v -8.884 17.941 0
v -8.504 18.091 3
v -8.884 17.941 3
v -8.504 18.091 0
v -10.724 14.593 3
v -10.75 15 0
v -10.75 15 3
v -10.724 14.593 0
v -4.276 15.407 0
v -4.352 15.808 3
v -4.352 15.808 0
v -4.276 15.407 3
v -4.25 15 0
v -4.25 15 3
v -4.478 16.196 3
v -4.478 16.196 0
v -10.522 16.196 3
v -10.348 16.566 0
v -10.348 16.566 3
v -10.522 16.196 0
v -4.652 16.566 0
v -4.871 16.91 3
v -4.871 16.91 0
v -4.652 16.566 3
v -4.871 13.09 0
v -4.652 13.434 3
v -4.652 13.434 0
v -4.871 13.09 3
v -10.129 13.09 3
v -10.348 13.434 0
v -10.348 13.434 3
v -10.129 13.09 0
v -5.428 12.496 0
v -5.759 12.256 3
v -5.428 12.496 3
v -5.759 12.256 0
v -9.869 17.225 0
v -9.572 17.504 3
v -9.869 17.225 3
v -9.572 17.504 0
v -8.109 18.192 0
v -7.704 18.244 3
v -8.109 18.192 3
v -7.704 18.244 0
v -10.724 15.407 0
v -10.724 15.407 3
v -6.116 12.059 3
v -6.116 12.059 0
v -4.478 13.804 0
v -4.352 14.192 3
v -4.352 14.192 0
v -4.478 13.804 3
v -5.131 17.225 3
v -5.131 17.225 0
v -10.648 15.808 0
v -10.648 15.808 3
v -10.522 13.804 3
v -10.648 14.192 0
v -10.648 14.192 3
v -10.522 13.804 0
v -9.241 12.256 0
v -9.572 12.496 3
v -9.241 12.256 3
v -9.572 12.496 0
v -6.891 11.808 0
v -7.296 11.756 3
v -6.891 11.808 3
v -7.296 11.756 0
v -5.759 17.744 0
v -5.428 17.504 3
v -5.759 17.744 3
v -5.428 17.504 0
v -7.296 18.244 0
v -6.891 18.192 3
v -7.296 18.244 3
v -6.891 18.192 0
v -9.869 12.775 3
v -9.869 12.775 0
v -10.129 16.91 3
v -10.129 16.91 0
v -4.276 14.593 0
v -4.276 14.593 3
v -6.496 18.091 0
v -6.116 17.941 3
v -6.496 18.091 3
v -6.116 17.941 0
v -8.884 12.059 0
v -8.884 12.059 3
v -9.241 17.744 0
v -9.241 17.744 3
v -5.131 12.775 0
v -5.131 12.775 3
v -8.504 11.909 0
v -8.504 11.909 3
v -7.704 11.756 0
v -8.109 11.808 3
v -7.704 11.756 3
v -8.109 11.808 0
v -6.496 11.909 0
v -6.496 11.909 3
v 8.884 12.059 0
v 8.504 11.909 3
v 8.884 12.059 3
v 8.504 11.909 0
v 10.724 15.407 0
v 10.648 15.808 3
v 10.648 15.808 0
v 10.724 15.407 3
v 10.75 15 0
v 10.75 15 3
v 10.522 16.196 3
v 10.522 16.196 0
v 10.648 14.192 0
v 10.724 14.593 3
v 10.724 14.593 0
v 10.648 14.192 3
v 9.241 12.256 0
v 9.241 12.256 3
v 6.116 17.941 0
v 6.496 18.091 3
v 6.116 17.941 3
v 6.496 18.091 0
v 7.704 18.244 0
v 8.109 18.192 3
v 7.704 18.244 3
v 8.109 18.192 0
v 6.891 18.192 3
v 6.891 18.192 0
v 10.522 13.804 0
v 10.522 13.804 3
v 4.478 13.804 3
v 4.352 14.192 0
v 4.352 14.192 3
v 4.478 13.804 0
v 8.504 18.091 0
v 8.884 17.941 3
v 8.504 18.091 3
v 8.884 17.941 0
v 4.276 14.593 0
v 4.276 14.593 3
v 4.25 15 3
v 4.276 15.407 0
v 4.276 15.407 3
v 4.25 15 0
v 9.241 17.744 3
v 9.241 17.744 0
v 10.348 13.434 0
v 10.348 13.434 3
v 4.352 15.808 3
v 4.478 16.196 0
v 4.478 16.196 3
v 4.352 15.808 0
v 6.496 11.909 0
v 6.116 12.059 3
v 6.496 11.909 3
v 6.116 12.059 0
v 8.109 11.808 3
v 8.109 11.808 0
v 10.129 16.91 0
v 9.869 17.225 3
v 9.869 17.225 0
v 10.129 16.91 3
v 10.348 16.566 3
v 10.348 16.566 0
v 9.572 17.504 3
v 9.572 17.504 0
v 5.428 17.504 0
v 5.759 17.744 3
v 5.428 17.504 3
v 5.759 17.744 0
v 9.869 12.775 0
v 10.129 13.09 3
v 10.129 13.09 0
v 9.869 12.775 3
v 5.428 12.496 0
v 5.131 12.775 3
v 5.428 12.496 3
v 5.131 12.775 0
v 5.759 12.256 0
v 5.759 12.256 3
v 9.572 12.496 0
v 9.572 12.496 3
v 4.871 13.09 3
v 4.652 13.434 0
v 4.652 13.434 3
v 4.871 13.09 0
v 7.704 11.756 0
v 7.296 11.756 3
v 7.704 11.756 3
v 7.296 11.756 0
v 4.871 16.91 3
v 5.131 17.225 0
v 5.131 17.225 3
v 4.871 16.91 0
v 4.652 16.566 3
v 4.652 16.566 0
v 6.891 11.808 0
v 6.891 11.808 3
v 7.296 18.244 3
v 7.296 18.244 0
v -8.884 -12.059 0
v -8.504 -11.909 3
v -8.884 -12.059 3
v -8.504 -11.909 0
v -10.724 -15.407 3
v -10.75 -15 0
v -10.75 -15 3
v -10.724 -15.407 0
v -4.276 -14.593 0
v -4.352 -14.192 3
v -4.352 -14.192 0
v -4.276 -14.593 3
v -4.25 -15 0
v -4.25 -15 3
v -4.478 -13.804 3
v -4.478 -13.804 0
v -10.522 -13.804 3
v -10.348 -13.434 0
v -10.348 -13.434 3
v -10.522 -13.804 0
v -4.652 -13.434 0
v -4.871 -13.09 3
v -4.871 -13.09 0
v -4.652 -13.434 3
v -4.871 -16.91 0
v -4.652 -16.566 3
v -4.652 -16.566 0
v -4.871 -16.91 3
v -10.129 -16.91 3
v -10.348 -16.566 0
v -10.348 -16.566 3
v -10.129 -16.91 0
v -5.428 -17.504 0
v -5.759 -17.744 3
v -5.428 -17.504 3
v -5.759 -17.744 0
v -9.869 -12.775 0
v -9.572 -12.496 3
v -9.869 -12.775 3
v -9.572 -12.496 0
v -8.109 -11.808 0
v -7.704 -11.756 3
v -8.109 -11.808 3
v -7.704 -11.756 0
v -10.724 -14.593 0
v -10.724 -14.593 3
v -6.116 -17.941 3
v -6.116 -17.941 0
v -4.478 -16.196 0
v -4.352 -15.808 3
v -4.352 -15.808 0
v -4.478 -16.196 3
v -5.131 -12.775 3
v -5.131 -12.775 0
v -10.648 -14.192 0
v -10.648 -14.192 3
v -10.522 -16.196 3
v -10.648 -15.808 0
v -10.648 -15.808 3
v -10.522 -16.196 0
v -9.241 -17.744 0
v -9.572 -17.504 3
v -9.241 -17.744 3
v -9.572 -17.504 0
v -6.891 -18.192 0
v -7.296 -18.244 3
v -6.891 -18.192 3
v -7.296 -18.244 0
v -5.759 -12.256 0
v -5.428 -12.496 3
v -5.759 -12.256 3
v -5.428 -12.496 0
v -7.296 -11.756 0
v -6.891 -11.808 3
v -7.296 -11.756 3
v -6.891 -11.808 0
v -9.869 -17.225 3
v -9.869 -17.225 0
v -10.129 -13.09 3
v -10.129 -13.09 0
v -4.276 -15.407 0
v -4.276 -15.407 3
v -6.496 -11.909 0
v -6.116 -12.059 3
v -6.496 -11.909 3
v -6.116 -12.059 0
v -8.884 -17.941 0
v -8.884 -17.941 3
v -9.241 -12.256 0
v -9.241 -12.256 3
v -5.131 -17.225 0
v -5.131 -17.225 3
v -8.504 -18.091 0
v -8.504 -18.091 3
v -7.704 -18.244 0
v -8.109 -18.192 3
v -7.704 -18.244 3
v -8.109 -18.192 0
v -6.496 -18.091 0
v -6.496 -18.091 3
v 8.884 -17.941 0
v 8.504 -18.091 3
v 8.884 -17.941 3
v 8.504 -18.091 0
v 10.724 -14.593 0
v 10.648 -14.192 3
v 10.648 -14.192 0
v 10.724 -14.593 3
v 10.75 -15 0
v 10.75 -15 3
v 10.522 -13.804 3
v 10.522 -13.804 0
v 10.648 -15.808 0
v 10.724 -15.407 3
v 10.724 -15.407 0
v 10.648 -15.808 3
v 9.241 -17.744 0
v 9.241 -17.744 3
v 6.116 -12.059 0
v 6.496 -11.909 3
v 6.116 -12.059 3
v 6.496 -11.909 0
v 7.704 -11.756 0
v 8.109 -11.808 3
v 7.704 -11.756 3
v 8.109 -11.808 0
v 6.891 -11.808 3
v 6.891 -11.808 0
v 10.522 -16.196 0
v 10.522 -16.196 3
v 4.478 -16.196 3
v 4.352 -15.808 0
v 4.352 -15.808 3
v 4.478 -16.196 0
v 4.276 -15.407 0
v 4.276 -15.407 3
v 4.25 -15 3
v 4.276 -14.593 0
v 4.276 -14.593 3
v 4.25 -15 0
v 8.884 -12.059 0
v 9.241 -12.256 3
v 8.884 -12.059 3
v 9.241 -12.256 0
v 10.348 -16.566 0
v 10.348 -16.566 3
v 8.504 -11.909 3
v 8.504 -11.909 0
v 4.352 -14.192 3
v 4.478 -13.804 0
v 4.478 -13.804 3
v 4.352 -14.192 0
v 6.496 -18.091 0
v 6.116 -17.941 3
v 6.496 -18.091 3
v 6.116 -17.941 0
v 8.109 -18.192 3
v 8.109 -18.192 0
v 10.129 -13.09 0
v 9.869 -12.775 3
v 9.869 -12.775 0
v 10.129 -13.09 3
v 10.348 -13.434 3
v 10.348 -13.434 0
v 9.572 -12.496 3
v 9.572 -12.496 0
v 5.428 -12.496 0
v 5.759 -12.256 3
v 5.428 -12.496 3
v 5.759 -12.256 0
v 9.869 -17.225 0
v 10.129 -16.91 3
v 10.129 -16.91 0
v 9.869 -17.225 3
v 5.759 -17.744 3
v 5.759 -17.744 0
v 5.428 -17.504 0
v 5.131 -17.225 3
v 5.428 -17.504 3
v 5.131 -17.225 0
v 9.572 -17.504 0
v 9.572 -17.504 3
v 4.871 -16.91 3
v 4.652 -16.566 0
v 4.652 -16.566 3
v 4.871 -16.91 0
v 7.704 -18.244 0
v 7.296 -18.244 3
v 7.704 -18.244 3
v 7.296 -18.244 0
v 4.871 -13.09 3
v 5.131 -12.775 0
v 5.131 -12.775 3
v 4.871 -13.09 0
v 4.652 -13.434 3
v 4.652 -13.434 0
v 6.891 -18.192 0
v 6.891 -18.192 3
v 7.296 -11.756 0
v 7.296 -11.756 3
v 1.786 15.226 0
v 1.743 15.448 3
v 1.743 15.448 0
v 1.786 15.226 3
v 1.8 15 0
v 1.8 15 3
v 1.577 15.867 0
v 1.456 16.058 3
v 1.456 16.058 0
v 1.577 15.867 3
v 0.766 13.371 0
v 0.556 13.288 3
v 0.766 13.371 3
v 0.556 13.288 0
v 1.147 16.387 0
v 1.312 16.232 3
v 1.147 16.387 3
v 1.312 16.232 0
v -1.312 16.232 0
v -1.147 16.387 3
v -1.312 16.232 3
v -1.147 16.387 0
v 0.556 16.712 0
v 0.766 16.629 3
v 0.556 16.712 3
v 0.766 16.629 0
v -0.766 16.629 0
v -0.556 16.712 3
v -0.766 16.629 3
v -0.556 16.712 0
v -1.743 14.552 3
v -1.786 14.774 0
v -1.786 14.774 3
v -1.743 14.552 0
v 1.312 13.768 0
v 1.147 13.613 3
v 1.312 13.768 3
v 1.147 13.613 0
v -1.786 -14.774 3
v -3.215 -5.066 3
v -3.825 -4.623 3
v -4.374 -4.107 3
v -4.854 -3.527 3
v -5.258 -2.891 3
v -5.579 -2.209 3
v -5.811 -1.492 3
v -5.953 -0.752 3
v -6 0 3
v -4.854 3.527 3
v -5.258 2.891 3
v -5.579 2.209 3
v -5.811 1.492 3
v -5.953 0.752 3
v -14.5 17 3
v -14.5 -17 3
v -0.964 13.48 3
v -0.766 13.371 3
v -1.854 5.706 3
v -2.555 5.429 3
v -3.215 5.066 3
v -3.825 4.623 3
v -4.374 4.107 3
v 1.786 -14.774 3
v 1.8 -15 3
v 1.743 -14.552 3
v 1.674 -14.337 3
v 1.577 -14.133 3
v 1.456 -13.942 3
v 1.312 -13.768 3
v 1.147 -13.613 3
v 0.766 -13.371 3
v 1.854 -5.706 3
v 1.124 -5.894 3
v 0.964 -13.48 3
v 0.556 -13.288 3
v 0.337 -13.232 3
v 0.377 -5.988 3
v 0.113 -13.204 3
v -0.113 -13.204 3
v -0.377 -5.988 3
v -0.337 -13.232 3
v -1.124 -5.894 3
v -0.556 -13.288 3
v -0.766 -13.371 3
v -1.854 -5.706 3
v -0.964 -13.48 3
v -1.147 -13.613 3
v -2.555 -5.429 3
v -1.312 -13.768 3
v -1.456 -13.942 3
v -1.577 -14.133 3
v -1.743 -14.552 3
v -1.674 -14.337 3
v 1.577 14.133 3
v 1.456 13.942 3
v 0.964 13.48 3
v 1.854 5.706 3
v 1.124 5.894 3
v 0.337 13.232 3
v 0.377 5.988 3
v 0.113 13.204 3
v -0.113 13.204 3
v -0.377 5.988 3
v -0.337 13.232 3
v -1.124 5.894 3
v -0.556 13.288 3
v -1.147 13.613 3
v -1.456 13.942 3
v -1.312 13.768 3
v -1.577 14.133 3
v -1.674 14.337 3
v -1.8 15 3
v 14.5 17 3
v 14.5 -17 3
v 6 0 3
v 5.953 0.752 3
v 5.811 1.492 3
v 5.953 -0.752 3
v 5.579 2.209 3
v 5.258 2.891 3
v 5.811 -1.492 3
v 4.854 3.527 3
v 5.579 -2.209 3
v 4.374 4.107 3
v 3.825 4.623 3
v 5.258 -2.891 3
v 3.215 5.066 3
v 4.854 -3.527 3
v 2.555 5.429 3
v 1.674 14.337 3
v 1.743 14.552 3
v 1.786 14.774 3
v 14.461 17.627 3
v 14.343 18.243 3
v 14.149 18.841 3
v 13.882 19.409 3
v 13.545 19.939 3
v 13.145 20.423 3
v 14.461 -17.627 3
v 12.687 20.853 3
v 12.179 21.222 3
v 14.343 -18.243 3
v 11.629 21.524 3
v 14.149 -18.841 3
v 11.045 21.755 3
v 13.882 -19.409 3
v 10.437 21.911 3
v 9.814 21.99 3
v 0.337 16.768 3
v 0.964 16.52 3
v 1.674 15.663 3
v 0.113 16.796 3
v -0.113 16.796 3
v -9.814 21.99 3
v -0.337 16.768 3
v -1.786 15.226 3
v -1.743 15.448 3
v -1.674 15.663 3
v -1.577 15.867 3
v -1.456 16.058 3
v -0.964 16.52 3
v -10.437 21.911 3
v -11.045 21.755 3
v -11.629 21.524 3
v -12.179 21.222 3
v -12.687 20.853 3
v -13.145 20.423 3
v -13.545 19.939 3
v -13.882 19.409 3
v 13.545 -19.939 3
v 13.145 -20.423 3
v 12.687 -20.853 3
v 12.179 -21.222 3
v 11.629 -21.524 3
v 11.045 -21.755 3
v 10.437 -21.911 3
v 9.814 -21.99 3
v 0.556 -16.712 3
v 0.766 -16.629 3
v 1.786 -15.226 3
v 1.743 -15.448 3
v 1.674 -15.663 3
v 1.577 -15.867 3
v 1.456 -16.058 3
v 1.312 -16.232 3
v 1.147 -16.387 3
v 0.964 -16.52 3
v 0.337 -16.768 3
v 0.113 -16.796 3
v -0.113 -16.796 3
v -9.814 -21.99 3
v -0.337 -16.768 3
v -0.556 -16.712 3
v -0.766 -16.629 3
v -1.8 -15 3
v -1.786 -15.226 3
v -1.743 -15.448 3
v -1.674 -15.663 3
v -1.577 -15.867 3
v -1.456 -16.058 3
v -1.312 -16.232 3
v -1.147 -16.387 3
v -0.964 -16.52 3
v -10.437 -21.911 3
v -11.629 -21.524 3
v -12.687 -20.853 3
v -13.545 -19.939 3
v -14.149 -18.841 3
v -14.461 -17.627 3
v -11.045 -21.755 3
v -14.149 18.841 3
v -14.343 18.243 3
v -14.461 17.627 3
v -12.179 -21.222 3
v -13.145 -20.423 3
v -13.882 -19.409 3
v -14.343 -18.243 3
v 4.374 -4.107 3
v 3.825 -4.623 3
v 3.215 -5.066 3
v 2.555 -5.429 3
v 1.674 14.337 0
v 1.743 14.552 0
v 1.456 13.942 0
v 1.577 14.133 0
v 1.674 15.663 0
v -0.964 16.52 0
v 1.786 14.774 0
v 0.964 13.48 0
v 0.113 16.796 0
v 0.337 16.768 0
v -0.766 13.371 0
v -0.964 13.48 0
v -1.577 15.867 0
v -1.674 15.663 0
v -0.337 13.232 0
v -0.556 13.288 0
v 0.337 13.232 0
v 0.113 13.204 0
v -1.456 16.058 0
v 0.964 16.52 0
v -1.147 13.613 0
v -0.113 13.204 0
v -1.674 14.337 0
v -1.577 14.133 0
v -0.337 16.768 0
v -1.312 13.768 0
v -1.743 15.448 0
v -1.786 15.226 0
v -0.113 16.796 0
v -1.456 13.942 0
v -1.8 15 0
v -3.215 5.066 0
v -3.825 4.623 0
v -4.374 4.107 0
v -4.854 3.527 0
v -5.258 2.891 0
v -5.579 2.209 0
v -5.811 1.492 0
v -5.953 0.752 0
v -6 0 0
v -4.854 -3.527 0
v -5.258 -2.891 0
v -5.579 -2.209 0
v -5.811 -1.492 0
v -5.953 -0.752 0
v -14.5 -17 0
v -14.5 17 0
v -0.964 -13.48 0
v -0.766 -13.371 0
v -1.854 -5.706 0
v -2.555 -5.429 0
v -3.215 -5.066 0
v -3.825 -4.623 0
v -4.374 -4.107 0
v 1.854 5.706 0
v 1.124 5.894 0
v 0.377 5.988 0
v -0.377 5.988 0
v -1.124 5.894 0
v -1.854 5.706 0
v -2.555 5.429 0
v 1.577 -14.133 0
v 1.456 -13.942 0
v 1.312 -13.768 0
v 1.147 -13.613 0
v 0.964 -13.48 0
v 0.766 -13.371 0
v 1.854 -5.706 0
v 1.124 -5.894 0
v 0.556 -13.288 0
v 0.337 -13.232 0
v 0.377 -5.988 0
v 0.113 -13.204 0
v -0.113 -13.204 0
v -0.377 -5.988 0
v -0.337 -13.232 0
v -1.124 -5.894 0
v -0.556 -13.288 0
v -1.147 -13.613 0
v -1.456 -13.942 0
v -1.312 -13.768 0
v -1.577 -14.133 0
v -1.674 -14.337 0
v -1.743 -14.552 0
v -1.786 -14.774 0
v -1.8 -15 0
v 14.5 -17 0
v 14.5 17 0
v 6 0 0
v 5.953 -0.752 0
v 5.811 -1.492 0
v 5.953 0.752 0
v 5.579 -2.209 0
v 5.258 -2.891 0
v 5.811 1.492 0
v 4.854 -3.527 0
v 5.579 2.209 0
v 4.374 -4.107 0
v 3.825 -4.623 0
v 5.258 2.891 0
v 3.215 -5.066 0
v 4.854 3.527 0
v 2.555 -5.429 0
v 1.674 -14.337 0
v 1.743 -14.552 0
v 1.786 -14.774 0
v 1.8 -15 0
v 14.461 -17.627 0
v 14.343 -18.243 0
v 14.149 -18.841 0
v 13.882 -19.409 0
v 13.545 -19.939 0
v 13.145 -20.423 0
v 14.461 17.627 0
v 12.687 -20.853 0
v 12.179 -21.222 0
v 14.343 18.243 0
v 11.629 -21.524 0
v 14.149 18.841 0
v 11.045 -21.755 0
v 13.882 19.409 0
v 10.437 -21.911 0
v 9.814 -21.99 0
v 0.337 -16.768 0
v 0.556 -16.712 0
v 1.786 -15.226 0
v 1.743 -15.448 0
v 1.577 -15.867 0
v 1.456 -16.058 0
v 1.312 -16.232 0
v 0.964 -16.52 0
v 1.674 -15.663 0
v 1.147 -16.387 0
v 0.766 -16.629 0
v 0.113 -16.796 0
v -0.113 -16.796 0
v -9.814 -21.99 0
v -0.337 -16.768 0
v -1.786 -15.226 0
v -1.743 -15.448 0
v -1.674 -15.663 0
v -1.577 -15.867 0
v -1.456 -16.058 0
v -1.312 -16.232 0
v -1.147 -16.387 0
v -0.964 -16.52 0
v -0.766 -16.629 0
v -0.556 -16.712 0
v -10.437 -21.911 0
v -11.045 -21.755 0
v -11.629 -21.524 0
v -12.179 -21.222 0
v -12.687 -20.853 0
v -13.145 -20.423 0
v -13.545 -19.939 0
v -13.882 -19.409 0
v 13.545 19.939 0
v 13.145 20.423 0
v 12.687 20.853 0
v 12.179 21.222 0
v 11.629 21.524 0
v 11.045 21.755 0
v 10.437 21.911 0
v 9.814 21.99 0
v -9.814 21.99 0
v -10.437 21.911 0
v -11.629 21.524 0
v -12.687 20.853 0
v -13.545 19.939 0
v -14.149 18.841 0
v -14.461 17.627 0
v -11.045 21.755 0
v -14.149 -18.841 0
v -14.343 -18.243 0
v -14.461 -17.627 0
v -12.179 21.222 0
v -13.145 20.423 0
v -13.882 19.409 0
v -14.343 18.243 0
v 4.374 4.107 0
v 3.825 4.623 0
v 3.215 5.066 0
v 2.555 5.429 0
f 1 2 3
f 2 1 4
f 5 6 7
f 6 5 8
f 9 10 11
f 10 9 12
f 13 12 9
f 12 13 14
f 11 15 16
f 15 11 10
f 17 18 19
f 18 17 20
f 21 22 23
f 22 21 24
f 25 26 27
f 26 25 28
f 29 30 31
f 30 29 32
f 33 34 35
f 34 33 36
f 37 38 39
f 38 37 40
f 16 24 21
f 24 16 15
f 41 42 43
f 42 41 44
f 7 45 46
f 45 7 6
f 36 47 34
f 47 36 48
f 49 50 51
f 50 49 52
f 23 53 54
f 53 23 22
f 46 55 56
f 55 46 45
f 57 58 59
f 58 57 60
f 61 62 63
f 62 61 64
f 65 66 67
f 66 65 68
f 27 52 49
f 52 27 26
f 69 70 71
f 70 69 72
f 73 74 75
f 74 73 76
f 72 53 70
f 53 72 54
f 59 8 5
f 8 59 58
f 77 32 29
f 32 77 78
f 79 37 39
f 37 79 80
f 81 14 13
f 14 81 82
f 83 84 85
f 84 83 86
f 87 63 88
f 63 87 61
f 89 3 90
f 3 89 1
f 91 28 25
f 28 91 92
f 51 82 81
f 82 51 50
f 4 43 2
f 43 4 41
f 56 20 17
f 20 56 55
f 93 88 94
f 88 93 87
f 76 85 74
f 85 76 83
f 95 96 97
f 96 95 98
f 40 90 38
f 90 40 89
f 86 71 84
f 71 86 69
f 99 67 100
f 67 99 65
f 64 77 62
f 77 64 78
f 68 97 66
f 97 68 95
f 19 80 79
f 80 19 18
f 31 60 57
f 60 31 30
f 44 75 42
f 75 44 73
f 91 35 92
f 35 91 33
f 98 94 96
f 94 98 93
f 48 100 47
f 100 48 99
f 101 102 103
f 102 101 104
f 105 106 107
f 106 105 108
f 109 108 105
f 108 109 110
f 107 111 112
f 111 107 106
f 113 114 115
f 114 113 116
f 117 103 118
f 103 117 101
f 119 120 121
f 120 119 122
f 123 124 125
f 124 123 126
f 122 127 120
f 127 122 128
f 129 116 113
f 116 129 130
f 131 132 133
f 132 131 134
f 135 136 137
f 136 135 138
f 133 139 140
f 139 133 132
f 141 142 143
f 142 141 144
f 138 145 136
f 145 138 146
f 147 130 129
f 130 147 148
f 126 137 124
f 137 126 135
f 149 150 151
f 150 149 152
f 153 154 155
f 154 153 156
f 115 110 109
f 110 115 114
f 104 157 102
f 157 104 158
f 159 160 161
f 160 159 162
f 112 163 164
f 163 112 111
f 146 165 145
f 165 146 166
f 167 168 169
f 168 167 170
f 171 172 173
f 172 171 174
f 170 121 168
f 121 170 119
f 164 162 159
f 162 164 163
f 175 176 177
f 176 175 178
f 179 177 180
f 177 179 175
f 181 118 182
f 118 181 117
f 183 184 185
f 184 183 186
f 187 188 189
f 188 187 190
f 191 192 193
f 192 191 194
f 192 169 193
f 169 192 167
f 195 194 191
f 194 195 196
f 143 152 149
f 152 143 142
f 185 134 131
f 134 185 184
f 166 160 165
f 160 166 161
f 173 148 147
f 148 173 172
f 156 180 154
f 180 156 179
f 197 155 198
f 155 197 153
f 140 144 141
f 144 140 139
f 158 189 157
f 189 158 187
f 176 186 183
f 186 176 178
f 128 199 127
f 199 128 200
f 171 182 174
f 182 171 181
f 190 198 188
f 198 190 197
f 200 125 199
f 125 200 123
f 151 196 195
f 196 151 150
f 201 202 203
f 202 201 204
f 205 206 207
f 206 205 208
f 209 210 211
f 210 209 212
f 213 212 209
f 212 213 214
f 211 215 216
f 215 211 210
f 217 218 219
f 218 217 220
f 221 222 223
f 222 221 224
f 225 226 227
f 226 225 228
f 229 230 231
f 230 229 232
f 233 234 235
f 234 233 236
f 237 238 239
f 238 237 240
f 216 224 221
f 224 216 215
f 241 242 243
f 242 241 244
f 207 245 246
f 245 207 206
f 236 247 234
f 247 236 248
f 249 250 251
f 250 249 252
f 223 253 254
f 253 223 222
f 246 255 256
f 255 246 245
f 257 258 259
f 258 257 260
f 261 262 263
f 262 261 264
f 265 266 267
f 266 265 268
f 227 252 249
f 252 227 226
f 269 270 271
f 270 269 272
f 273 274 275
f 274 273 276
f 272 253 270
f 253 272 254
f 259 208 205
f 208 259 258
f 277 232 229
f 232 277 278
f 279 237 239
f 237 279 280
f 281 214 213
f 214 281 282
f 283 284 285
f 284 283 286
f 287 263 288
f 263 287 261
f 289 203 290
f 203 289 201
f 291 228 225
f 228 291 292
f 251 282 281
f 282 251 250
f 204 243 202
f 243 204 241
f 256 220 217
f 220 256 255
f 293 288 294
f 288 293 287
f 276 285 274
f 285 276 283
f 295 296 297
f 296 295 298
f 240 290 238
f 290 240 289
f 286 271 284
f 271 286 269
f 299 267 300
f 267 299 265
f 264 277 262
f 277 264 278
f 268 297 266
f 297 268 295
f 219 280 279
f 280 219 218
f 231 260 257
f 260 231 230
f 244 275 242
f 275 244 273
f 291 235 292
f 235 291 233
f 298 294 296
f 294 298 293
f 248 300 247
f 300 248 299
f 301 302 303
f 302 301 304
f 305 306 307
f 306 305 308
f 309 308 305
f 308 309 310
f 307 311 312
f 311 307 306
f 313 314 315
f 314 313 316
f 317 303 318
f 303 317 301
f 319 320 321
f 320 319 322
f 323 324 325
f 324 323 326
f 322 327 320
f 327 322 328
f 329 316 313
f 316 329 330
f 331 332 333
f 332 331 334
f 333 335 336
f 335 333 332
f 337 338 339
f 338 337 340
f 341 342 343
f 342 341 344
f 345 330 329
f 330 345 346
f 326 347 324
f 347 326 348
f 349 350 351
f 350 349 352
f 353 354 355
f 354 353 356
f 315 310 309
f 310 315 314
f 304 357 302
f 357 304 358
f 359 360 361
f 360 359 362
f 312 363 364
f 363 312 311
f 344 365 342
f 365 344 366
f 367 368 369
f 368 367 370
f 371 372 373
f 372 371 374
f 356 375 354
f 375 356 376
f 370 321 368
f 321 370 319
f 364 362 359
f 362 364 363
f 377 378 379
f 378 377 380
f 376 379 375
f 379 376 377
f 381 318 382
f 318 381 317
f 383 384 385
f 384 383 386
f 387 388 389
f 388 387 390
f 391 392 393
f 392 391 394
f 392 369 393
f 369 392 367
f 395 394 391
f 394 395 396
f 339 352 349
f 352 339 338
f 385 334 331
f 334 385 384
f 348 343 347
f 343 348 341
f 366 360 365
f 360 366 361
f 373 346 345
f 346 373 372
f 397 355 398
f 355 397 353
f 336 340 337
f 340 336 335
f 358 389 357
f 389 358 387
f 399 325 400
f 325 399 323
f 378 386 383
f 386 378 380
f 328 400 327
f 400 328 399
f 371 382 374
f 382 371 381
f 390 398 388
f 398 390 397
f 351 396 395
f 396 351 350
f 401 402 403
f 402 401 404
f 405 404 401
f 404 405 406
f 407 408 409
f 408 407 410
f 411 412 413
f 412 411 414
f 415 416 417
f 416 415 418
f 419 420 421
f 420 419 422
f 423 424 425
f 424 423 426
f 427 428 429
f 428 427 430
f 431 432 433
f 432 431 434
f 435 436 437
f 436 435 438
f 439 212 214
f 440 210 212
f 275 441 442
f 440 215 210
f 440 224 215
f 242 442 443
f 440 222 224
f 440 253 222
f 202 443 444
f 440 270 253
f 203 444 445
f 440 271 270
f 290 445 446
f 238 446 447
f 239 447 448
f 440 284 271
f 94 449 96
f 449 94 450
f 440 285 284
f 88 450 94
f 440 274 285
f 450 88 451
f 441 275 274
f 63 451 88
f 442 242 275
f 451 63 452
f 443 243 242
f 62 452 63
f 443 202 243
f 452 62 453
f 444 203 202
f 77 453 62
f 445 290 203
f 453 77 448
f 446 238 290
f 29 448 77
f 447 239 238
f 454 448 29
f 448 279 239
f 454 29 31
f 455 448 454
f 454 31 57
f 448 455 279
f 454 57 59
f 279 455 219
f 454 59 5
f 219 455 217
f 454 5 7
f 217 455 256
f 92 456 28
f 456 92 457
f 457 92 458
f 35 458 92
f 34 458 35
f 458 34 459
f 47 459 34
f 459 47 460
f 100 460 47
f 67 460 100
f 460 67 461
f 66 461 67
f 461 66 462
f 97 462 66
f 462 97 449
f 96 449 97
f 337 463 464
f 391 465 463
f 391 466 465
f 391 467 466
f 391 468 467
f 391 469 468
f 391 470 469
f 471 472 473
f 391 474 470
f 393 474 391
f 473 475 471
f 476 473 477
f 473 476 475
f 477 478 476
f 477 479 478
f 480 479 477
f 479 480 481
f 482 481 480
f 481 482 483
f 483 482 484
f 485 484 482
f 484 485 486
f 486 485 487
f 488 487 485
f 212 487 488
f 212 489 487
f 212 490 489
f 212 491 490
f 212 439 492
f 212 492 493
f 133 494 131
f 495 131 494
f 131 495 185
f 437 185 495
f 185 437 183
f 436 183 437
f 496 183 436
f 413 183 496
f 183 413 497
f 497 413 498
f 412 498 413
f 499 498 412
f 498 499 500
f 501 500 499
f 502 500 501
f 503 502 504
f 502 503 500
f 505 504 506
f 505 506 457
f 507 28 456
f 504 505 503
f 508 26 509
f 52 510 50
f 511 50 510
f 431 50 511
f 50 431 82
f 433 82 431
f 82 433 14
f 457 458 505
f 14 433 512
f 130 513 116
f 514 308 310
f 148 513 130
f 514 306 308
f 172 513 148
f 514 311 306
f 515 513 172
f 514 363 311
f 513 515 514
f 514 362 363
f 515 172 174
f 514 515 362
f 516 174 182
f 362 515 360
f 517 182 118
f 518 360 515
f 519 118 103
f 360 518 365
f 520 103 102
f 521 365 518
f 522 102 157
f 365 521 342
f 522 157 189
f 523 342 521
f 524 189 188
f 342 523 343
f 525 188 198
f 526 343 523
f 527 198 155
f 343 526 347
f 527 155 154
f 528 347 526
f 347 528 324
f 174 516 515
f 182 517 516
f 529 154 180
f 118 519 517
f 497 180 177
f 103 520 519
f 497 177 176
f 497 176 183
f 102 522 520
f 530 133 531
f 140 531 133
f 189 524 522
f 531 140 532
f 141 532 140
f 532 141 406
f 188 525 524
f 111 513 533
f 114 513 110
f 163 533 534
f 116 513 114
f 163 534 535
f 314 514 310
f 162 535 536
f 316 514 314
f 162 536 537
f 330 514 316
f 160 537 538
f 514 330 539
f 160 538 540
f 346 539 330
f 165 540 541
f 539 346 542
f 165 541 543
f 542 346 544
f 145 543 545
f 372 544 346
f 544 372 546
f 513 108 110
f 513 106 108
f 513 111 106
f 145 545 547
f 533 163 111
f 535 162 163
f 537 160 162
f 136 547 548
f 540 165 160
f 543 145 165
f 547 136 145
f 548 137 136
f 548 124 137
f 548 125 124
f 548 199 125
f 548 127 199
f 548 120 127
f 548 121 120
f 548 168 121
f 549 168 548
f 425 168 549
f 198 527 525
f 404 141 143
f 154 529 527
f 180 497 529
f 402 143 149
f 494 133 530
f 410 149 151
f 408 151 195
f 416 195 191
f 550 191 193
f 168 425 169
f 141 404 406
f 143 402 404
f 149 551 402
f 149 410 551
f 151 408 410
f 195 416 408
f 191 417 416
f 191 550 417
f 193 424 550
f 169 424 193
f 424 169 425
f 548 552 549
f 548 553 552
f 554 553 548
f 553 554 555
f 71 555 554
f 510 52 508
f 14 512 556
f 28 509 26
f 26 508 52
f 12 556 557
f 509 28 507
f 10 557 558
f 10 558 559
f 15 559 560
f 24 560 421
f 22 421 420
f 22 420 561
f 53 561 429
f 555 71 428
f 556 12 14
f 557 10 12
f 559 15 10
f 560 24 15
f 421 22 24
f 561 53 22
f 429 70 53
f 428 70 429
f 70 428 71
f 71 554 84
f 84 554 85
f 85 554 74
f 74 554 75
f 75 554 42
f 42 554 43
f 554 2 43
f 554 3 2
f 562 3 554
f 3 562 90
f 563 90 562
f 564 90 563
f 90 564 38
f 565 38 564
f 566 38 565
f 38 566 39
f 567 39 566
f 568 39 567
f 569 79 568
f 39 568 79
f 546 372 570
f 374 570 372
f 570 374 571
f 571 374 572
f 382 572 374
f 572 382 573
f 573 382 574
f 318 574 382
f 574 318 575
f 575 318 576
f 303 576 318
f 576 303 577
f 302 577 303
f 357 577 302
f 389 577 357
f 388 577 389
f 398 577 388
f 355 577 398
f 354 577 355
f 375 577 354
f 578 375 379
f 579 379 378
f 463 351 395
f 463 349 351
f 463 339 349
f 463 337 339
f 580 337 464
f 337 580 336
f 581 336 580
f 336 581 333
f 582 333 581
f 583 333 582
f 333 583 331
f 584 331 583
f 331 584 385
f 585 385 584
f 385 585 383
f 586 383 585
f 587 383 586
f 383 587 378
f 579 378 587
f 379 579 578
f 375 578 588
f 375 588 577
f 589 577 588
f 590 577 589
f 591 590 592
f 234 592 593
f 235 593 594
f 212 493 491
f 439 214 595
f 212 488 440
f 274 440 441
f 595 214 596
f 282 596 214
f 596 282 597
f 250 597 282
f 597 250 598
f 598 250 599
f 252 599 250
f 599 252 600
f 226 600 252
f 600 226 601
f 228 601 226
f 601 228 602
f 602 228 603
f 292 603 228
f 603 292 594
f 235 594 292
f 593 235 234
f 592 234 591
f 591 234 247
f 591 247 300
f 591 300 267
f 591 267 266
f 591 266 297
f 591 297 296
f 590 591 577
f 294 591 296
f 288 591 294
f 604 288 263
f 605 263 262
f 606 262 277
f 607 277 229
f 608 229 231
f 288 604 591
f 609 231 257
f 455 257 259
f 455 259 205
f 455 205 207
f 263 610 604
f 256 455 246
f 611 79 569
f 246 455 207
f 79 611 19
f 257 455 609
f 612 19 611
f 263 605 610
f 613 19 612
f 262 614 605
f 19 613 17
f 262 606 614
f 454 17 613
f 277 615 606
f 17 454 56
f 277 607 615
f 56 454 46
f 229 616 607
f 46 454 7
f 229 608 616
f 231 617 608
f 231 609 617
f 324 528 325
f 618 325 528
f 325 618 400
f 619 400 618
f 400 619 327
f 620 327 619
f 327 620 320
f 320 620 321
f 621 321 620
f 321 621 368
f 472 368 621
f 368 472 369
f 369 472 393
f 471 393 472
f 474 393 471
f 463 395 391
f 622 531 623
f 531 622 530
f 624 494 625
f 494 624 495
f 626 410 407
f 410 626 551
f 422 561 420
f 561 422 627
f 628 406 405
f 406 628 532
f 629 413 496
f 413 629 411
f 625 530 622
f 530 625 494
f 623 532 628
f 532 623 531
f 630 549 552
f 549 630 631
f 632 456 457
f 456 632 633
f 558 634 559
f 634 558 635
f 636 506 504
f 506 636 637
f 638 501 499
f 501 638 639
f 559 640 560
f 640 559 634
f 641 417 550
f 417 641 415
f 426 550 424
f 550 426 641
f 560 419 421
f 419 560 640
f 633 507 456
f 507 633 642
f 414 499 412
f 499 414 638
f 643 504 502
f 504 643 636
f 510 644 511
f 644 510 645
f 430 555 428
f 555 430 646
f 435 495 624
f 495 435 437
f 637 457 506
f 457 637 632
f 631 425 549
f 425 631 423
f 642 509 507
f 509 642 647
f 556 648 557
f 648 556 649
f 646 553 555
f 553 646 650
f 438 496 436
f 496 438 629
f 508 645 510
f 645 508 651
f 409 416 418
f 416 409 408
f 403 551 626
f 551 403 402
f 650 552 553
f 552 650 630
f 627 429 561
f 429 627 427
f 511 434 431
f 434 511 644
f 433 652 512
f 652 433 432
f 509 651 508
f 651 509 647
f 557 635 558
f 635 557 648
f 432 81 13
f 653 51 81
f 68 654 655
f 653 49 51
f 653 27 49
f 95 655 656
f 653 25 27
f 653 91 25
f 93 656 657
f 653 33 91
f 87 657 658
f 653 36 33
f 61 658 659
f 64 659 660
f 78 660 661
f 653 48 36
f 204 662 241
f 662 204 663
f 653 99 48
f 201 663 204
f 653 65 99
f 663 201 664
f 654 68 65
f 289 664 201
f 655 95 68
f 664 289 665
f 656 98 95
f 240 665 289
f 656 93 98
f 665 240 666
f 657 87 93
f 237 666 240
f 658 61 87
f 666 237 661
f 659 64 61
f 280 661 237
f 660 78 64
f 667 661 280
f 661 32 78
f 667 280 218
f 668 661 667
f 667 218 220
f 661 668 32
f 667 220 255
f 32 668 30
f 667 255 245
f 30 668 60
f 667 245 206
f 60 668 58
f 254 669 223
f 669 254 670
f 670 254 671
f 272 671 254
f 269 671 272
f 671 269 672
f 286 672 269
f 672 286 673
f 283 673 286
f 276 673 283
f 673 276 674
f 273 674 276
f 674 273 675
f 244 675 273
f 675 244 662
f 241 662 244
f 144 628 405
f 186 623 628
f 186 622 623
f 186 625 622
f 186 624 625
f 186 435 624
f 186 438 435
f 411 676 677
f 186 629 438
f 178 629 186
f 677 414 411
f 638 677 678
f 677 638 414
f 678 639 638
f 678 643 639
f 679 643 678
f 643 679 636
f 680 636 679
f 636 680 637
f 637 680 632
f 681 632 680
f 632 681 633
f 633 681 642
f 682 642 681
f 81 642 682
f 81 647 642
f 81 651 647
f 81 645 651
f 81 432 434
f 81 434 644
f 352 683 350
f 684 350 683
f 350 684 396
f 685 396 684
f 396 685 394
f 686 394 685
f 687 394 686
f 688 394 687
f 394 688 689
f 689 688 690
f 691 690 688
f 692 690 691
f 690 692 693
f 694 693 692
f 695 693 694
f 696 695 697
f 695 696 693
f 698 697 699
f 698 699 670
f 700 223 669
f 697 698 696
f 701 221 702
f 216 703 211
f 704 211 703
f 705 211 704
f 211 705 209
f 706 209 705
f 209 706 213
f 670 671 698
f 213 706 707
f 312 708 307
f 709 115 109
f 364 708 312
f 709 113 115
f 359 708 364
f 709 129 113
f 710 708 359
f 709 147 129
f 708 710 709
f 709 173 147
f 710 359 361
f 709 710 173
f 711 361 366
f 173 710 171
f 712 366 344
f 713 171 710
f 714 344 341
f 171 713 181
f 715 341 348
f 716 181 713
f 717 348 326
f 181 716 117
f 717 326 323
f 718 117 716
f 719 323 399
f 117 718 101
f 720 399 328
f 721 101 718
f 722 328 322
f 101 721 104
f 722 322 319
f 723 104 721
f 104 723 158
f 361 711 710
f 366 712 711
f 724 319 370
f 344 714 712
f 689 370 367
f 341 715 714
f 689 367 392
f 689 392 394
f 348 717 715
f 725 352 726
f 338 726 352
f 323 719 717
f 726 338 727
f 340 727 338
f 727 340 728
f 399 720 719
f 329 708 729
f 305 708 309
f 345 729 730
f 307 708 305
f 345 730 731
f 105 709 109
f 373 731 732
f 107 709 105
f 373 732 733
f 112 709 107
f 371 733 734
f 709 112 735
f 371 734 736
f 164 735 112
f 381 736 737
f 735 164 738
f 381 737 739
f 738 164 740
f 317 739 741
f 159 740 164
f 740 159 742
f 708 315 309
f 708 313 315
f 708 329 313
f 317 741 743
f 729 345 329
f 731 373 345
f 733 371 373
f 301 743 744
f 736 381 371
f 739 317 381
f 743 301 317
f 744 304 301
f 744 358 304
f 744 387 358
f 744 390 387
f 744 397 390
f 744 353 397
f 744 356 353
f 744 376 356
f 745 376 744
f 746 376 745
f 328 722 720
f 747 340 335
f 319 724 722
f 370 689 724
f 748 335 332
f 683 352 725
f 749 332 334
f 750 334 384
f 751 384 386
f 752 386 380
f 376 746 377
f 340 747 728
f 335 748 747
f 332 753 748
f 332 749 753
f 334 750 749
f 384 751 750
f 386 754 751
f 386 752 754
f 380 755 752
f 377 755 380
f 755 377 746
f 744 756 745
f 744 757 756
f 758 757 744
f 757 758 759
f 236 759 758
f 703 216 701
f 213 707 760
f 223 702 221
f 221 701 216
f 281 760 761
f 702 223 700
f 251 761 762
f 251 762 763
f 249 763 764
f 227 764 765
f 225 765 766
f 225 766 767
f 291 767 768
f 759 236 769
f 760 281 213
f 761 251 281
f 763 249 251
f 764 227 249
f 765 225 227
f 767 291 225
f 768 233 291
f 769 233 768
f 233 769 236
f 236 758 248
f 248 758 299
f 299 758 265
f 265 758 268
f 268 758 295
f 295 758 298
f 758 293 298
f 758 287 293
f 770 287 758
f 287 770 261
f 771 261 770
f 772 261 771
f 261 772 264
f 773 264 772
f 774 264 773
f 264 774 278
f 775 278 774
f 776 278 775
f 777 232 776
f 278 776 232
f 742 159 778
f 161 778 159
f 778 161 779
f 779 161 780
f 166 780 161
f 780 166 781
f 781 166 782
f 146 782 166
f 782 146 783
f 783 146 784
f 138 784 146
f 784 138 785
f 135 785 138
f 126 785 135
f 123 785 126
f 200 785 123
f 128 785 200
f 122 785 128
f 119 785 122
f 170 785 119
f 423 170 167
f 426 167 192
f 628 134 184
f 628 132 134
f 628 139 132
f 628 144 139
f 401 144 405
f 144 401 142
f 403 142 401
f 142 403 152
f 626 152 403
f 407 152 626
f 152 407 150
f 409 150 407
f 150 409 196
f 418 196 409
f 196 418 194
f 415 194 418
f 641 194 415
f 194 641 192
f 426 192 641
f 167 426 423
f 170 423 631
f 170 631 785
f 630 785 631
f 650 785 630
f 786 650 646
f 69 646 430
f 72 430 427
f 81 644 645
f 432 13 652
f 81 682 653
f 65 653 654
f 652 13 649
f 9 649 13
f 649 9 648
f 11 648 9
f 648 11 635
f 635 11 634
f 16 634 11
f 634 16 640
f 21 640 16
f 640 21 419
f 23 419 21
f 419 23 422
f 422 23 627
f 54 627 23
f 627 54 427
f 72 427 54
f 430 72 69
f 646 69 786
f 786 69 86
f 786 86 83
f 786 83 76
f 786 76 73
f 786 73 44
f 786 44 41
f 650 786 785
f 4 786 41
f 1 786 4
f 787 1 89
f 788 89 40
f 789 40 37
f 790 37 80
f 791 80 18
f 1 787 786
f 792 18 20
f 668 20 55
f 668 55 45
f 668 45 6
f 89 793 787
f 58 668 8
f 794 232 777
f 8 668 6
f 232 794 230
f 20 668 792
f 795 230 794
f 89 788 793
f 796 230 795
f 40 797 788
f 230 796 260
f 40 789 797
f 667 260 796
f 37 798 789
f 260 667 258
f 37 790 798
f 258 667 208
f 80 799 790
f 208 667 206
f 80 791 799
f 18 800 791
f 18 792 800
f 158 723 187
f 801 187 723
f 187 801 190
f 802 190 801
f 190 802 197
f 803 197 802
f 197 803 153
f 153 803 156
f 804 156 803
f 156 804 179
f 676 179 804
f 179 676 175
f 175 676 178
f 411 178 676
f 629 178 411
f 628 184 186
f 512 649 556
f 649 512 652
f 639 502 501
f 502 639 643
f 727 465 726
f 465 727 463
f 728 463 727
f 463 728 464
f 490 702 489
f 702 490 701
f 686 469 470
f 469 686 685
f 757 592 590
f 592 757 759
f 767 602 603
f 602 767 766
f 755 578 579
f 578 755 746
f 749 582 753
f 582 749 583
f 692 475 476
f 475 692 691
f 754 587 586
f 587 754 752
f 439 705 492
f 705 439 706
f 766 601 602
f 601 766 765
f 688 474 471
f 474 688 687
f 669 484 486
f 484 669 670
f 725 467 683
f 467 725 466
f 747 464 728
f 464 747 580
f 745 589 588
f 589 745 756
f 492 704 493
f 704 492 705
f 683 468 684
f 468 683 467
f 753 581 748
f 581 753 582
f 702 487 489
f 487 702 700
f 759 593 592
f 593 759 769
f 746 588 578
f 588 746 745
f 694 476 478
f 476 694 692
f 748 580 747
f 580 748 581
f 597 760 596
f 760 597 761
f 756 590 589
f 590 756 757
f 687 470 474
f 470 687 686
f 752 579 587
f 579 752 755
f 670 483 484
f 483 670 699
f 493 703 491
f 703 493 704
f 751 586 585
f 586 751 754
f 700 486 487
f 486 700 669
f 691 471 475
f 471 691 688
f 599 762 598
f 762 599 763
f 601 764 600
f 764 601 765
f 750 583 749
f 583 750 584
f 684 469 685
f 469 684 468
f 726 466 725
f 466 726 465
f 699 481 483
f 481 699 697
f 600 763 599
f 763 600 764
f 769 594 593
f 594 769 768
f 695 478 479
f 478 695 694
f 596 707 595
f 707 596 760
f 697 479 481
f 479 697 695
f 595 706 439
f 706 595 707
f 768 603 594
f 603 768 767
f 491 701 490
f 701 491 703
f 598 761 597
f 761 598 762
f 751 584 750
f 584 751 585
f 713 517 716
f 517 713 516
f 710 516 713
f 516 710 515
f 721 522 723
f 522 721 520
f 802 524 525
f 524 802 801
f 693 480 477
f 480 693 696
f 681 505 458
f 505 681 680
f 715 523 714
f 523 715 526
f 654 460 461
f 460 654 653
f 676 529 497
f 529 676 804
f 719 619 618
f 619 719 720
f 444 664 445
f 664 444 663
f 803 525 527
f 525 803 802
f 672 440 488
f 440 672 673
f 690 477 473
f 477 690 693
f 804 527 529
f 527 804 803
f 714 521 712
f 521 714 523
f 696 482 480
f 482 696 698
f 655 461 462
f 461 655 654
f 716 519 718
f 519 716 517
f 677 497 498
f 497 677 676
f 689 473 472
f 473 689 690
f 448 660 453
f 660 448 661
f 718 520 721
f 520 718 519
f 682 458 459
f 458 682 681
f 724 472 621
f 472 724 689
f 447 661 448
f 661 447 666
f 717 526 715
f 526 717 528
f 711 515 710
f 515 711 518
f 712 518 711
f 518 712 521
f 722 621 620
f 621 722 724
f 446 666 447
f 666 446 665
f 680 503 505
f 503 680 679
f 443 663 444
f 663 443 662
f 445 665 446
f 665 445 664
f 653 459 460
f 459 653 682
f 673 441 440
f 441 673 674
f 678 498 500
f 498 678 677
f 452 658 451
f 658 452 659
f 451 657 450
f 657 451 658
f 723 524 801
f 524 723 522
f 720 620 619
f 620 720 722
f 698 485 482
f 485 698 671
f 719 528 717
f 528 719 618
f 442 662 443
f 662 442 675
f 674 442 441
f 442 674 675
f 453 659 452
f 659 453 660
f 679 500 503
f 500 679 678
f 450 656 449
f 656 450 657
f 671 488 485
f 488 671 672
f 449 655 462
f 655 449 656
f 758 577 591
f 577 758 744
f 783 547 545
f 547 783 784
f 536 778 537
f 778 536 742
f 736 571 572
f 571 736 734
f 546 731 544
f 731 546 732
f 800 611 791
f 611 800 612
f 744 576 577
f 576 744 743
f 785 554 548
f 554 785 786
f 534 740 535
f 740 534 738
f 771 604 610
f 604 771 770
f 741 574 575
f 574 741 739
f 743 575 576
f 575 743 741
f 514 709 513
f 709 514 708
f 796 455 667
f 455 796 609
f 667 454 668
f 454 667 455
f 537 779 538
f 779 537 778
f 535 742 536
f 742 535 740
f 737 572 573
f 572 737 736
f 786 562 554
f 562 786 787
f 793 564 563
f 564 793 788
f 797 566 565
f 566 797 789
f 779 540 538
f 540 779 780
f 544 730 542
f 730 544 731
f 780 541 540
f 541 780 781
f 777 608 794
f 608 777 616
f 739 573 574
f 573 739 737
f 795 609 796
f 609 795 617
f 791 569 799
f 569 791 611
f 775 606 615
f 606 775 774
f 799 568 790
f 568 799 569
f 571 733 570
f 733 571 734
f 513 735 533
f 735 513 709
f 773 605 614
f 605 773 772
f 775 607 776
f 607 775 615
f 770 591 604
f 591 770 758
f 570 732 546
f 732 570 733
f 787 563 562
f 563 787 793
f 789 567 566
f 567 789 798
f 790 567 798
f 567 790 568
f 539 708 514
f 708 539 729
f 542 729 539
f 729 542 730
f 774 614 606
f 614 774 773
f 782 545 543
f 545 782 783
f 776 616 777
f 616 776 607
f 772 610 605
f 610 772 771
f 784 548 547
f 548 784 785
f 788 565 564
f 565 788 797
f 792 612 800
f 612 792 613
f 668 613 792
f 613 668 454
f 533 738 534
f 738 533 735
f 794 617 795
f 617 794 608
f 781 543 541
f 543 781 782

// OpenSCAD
$fn = 50;


difference() {
	union() {
		hull() {
			translate(v = [-9.5000000000, 17.0000000000, 0]) {
				cylinder(h = 3, r = 5);
			}
			translate(v = [9.5000000000, 17.0000000000, 0]) {
				cylinder(h = 3, r = 5);
			}
			translate(v = [-9.5000000000, -17.0000000000, 0]) {
				cylinder(h = 3, r = 5);
			}
			translate(v = [9.5000000000, -17.0000000000, 0]) {
				cylinder(h = 3, r = 5);
			}
		}
	}
	union() {
		#translate(v = [-7.5000000000, 15.0000000000, 0]) {
			cylinder(h = 3, r = 3.2500000000);
		}
		#translate(v = [7.5000000000, 15.0000000000, 0]) {
			cylinder(h = 3, r = 3.2500000000);
		}
		#translate(v = [-7.5000000000, -15.0000000000, 0]) {
			cylinder(h = 3, r = 3.2500000000);
		}
		#translate(v = [7.5000000000, -15.0000000000, 0]) {
			cylinder(h = 3, r = 3.2500000000);
		}
		#translate(v = [-7.5000000000, -15.0000000000, -100.0000000000]) {
			cylinder(h = 200, r = 3.2500000000);
		}
		#translate(v = [-7.5000000000, 15.0000000000, -100.0000000000]) {
			cylinder(h = 200, r = 3.2500000000);
		}
		#translate(v = [7.5000000000, -15.0000000000, -100.0000000000]) {
			cylinder(h = 200, r = 3.2500000000);
		}
		#translate(v = [7.5000000000, 15.0000000000, -100.0000000000]) {
			cylinder(h = 200, r = 3.2500000000);
		}
		#translate(v = [-7.5000000000, 15.0000000000, 0]) {
			cylinder(h = 3, r = 1.8000000000);
		}
		#translate(v = [0.0000000000, 15.0000000000, 0]) {
			cylinder(h = 3, r = 1.8000000000);
		}
		#translate(v = [7.5000000000, 15.0000000000, 0]) {
			cylinder(h = 3, r = 1.8000000000);
		}
		#translate(v = [-7.5000000000, -15.0000000000, 0]) {
			cylinder(h = 3, r = 1.8000000000);
		}
		#translate(v = [0.0000000000, -15.0000000000, 0]) {
			cylinder(h = 3, r = 1.8000000000);
		}
		#translate(v = [7.5000000000, -15.0000000000, 0]) {
			cylinder(h = 3, r = 1.8000000000);
		}
		#translate(v = [-7.5000000000, 15.0000000000, 0]) {
			cylinder(h = 3, r = 1.8000000000);
		}
		#translate(v = [0.0000000000, 15.0000000000, 0]) {
			cylinder(h = 3, r = 1.8000000000);
		}
		#translate(v = [7.5000000000, 15.0000000000, 0]) {
			cylinder(h = 3, r = 1.8000000000);
		}
		#translate(v = [-7.5000000000, -15.0000000000, 0]) {
			cylinder(h = 3, r = 1.8000000000);
		}
		#translate(v = [0.0000000000, -15.0000000000, 0]) {
			cylinder(h = 3, r = 1.8000000000);
		}
		#translate(v = [7.5000000000, -15.0000000000, 0]) {
			cylinder(h = 3, r = 1.8000000000);
		}
		#translate(v = [-7.5000000000, 15.0000000000, 0]) {
			cylinder(h = 3, r = 1.8000000000);
		}
		#translate(v = [0.0000000000, 15.0000000000, 0]) {
			cylinder(h = 3, r = 1.8000000000);
		}
		#translate(v = [7.5000000000, 15.0000000000, 0]) {
			cylinder(h = 3, r = 1.8000000000);
		}
		#translate(v = [-7.5000000000, -15.0000000000, 0]) {
			cylinder(h = 3, r = 1.8000000000);
		}
		#translate(v = [0.0000000000, -15.0000000000, 0]) {
			cylinder(h = 3, r = 1.8000000000);
		}
		#translate(v = [7.5000000000, -15.0000000000, 0]) {
			cylinder(h = 3, r = 1.8000000000);
		}
		#cylinder(h = 3, r = 6.0000000000);
	}
}
